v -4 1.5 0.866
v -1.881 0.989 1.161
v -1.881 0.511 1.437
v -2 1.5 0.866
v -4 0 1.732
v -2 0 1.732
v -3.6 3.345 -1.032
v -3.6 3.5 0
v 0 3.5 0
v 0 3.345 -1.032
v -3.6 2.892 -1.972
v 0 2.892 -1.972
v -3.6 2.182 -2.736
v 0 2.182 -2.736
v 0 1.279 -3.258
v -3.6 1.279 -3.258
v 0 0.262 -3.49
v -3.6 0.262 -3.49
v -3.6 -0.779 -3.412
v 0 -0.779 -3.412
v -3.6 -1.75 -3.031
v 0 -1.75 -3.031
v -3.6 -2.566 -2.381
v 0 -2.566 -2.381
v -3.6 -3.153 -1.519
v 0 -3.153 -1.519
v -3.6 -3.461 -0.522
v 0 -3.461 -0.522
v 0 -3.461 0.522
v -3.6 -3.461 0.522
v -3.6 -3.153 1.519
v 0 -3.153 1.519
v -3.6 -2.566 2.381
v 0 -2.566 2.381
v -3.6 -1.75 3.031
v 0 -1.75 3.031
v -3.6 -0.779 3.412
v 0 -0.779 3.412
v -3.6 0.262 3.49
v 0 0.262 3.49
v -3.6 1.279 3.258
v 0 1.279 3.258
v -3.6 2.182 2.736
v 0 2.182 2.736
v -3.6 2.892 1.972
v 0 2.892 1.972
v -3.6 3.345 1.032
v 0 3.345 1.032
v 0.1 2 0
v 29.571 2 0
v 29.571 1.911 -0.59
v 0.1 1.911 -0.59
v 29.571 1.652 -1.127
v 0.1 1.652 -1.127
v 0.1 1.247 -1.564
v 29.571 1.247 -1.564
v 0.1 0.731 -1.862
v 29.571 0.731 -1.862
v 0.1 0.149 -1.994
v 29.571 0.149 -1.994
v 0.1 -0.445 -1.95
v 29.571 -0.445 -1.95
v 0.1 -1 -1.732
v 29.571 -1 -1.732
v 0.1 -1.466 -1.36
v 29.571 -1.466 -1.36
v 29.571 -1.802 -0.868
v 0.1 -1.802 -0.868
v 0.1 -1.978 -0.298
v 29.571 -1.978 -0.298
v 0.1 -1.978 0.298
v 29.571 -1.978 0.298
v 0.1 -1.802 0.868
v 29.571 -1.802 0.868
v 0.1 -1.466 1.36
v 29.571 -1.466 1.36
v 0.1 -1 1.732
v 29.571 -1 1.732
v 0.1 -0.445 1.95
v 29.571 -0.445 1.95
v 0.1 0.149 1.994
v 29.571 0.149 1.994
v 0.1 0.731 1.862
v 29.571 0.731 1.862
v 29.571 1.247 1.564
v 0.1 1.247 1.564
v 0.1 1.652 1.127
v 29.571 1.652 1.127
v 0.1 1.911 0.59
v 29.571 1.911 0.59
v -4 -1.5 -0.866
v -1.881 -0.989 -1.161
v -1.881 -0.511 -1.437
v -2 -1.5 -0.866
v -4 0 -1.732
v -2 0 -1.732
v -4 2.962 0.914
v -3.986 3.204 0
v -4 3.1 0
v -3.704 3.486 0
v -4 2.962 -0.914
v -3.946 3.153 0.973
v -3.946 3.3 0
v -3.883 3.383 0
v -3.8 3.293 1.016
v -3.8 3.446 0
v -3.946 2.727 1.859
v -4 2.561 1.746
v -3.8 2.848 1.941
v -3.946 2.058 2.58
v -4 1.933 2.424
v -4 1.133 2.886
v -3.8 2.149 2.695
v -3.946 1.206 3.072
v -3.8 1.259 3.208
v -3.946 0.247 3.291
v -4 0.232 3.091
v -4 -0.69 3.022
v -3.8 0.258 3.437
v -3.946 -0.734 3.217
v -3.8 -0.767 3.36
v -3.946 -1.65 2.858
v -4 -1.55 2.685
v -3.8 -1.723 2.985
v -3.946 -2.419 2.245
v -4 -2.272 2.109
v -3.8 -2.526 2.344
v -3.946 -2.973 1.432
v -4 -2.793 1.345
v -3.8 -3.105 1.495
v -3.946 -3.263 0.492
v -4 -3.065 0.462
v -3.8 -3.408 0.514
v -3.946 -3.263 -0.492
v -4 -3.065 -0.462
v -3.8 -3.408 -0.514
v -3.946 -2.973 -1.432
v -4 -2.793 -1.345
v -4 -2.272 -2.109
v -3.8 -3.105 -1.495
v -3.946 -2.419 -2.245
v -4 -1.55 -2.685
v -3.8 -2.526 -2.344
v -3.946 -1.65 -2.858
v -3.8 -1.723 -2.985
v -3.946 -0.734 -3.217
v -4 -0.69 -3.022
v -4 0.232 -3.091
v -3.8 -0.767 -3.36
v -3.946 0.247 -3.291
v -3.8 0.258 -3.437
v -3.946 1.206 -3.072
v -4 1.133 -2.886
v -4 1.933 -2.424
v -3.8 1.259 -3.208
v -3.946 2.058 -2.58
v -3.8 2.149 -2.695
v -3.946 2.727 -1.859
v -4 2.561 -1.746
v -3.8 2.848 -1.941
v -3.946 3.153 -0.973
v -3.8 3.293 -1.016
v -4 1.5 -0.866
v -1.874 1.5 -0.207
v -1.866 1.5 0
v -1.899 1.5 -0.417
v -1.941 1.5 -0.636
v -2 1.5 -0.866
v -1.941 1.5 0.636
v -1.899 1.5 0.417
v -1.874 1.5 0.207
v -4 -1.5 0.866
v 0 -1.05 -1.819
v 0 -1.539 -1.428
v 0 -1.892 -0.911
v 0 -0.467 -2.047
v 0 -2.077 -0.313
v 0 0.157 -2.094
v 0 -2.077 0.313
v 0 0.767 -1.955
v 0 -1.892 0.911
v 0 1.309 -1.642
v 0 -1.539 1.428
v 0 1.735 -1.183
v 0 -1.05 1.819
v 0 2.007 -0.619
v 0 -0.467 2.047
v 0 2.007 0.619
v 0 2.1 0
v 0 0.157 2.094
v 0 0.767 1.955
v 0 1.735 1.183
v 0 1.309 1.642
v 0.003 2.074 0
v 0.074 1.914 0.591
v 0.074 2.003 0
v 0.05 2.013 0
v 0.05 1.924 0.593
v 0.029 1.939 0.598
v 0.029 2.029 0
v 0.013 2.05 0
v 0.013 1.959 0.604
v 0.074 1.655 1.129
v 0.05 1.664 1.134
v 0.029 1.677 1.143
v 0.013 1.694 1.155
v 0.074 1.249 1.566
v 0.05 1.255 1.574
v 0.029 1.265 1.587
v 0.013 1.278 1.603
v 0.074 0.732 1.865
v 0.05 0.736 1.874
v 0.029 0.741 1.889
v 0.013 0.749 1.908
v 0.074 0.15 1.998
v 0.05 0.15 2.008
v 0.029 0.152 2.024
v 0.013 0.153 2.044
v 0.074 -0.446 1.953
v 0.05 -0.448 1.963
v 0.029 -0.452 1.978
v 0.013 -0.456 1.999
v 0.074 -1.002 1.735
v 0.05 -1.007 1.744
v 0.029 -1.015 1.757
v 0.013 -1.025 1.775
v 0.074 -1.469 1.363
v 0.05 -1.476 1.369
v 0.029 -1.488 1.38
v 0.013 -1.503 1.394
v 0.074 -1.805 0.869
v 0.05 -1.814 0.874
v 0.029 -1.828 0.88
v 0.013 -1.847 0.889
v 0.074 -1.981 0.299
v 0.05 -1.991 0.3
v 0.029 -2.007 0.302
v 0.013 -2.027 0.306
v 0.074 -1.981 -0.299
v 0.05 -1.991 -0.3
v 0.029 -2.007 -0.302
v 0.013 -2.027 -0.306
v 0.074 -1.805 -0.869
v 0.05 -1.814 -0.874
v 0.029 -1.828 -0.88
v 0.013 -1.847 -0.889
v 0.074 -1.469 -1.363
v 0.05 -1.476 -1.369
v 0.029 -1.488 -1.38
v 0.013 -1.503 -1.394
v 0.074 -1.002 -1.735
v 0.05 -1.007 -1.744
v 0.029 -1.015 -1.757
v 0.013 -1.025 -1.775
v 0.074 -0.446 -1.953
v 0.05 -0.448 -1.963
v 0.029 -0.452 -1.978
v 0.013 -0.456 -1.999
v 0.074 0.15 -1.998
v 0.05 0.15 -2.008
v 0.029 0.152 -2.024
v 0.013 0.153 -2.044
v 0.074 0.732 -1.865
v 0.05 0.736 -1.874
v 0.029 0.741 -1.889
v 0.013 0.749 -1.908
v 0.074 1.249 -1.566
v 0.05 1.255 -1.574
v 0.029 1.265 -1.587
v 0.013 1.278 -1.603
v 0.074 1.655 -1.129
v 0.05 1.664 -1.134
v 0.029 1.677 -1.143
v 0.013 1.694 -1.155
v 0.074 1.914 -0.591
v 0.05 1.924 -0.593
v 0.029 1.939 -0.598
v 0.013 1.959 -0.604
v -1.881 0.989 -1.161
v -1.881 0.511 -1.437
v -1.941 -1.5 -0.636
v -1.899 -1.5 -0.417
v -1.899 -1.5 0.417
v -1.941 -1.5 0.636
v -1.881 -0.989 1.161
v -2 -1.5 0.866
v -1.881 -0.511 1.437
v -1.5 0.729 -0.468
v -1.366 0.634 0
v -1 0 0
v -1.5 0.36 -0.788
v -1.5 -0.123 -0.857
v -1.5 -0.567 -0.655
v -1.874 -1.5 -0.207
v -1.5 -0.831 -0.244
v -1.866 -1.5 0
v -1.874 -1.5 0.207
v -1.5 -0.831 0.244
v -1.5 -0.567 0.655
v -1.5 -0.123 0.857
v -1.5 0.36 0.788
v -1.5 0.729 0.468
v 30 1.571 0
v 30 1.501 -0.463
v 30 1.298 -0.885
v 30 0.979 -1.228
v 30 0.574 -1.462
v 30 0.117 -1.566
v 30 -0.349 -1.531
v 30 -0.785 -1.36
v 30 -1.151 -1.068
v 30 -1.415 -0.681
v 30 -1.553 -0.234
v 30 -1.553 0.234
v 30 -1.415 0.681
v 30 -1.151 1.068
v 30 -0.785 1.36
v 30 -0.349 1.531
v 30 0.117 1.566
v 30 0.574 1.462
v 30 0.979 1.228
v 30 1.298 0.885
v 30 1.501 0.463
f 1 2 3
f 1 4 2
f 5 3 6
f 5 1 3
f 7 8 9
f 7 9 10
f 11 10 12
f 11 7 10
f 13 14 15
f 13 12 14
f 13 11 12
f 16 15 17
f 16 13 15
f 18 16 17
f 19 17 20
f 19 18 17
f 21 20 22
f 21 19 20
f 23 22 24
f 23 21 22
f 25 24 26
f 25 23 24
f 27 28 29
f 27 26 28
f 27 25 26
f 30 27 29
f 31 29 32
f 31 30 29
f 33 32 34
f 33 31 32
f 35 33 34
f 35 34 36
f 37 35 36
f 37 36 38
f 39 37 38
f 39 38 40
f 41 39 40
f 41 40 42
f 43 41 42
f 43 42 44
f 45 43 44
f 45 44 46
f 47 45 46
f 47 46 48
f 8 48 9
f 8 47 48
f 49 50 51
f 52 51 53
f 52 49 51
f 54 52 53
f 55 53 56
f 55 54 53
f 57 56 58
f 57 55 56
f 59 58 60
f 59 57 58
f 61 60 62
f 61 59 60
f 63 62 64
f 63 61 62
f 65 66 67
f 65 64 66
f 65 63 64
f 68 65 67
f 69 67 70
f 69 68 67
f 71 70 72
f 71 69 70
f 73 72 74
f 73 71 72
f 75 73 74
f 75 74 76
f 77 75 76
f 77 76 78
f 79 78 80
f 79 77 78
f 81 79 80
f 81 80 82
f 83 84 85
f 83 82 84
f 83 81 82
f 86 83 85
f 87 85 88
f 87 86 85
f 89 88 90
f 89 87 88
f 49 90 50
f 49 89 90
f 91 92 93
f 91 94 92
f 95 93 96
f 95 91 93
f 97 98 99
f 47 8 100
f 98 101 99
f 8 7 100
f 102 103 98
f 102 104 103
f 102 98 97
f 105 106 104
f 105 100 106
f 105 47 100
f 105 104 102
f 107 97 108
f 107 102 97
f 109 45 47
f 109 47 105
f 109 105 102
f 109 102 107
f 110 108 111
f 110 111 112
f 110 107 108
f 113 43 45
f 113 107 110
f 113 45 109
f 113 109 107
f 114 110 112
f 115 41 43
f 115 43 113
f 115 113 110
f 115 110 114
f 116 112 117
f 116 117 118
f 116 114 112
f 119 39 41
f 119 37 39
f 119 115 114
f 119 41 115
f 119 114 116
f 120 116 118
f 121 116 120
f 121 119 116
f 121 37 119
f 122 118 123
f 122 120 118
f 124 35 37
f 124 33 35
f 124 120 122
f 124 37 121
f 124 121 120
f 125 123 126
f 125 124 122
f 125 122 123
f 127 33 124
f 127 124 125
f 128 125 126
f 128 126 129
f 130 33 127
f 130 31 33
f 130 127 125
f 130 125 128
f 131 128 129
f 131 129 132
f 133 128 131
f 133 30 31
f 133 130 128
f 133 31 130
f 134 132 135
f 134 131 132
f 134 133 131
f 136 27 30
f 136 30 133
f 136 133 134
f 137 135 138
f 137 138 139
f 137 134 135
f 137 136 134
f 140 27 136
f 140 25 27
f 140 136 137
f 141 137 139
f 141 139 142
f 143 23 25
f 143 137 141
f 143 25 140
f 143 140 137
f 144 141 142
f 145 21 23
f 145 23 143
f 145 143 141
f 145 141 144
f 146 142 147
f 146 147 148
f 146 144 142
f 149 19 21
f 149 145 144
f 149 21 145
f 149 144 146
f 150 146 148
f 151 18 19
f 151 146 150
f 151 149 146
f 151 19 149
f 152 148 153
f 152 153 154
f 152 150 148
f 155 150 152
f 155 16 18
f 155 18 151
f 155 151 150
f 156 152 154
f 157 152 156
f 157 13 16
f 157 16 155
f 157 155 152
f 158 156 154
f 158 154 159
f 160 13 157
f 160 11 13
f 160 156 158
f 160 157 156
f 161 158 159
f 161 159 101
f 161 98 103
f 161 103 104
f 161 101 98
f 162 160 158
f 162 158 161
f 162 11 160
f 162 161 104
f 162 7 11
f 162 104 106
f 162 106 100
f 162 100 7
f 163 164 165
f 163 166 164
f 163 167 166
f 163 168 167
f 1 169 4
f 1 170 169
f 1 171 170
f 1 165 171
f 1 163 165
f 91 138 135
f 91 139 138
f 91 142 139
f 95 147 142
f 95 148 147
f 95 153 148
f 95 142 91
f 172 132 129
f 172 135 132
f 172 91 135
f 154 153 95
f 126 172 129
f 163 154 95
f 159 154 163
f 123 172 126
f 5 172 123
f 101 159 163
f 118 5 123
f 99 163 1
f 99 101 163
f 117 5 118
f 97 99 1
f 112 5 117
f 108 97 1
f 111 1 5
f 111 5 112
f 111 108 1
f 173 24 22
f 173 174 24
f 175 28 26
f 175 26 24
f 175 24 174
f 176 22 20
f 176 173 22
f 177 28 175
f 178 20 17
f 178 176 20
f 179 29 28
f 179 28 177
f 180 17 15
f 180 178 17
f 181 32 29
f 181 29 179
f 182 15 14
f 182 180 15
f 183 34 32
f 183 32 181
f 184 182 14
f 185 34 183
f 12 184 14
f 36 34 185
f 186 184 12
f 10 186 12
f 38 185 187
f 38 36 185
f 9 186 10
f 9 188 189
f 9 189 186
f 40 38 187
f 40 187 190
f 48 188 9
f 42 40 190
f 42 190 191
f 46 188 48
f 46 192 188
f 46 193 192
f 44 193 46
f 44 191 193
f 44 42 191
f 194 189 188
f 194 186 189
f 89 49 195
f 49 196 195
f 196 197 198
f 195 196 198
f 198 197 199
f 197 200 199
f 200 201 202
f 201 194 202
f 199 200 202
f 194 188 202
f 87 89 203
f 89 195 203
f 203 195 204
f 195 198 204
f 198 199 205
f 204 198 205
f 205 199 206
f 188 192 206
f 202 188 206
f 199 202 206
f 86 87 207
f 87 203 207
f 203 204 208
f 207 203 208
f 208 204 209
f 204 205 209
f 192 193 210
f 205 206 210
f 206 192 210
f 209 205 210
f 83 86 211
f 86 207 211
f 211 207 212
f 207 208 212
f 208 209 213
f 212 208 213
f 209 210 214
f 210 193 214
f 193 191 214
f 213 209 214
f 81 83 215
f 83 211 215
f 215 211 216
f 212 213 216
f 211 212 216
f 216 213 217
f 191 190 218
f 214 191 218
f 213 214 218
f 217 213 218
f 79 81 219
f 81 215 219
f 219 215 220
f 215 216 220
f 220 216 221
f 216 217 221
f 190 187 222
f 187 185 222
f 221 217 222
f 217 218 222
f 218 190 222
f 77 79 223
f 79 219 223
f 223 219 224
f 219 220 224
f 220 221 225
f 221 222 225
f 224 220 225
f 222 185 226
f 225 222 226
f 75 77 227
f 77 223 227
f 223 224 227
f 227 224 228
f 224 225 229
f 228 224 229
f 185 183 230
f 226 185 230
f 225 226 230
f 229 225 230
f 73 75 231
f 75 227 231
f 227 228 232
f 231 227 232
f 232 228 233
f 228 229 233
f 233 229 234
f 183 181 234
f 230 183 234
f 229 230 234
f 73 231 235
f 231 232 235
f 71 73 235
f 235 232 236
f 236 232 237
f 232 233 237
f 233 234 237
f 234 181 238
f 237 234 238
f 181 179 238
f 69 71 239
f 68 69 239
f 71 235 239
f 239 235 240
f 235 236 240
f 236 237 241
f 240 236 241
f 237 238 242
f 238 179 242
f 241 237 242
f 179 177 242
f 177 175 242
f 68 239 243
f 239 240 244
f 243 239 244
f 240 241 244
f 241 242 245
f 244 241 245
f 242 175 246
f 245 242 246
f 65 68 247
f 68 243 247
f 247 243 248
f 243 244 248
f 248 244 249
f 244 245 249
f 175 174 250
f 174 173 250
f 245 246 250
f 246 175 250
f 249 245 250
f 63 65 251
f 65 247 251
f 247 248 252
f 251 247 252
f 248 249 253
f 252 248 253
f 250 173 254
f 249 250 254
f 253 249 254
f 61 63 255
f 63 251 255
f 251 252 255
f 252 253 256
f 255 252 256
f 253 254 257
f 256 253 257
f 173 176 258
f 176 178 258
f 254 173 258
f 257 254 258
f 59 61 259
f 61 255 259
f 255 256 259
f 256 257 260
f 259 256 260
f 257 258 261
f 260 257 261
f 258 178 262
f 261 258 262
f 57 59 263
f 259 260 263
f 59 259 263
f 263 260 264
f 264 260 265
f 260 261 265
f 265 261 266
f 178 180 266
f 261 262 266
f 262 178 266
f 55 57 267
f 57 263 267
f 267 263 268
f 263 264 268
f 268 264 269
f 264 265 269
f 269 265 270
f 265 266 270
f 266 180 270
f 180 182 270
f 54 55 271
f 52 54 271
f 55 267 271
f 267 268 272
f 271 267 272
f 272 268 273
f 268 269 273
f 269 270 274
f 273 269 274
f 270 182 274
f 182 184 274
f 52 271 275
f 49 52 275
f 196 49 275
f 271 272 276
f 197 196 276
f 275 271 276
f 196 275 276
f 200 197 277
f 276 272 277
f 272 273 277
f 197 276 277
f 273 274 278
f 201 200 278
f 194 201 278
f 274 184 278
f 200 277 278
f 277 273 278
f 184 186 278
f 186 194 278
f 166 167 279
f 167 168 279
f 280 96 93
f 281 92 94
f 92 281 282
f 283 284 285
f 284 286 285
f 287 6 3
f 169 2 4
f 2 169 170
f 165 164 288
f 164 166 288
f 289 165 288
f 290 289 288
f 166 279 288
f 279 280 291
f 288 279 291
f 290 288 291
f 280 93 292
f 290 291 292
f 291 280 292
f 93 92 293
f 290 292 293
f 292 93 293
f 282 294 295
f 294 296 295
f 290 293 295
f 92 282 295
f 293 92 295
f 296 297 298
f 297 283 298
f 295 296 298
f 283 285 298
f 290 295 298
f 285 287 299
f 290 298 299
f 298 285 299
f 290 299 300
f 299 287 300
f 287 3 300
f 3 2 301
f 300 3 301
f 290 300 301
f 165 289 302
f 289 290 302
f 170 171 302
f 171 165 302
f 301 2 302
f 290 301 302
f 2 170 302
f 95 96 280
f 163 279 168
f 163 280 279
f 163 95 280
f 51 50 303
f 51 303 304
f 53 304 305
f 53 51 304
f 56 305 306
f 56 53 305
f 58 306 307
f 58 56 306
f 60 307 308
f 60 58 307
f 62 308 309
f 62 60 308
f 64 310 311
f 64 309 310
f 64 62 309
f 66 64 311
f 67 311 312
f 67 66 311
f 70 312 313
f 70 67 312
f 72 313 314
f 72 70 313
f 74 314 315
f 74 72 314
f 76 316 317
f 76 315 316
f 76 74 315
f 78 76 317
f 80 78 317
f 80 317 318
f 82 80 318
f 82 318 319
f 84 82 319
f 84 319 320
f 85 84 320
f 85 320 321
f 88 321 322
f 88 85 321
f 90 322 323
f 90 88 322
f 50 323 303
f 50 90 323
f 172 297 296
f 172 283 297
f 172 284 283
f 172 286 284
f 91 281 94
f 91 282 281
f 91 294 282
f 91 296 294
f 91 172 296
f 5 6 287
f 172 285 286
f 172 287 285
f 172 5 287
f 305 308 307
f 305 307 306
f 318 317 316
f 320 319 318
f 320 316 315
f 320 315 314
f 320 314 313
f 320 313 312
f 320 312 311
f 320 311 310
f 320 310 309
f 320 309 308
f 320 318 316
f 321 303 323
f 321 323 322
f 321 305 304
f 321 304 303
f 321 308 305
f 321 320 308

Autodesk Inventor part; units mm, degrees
ref_plane "YZ Plane" through (0, 0, 0) normal (1, 0, 0) x (0, 1, 0)
ref_plane "XZ Plane" through (0, 0, 0) normal (0, 1, 0) x (-1, 0, 0)
sketch "Sketch1" plane through (0, 0, 0) normal (0, 0, 1) x (1, 0, 0)
  line L0 (-1, 0) -> (30, 0)
  line L1 (30, 0) -> (30, 2)
  line L2 (30, 2) -> (10, 2)
  line L3 (10, 2) -> (9.5705, 2)
  line L4 (9.5705, 2) -> (0, 2)
  line L5 (0, 2) -> (0, 3.5)
  line L6 (0, 3.5) -> (-4, 3.5)
  line L7 (-4, 3.5) -> (-4, 1.7321)
  line L8 (-4, 1.7321) -> (-2, 1.7321)
  line L9 (-2, 1.7321) -> (-1, 0)
  line L10 (-10.8, 0) -> (36.8, 0) projected
  line L11 (0, -0.7) -> (0, 4.2) projected
  line L12 (10, 2) -> (0, 2) construction
  dimension "d1" = 20
  dimension "d2" = 0.4295
  dimension "d3" = 4
  dimension "d4" = 2
  dimension "d5" = 60
  dimension "d6" = 4
  dimension "d7" = 4
  dimension "d8" = 3.4641
  dimension "d9" = 7
  dimension "d26" = 30
revolve "Body" add sketch "Sketch1" angle 360 about axis through (-1, 0, 0) along (1, 0, 0)
sketch "Sketch2" plane through (-4, 0, 0) normal (-1, 0, 0) x (0, 0, 1)
  circle A0 centre (0, 0) radius 1.7321 projected
  line L0 (0, -4.9) -> (0, 4.9) projected
  line L1 (-4.9, 0) -> (4.9, 0) projected
  line L2 (1.7321, 0) -> (0.866, -1.5)
  line L3 (0.866, -1.5) -> (-0.866, -1.5)
  line L4 (-0.866, -1.5) -> (-1.7321, 0)
  line L5 (-1.7321, 0) -> (-0.866, 1.5)
  line L6 (-0.866, 1.5) -> (0.866, 1.5)
  line L7 (0.866, 1.5) -> (1.7321, 0)
extrude "Slot" add sketch "Sketch2" against normal up to next contours L7 A0 | A0 L2 | L6 L0 A0 | A0 L0 L3 | L0 L6 A0 | A0 L3 L0 | L4 A0 | A0 L5
fillet "Fillet1" radius 0.4 1 edges at (-4, -3.5, 0)
thread "Thread" size "M4x0.7" class "6g" standard "ISO Metric profile" length 20
chamfer "Chamfer1" distance 0.4294 distance2 0.4294 1 edges at (30, -2, 0) measured on face at (30, -0.499, -0.4421)
ref_plane "Work Plane1" through (29, 0, 0) normal (0, -1, 0) x (1, 0, 0)
fillet "Fillet2" radius 0.1 1 edges at (0, -2, 0)
equation "\"d1\" = GEL"
equation "\"d3\" = KOH"
equation "\"d4\" = INTI"
equation "\"d6\" = GD"
equation "\"d7\" = BDM"
equation "\"d8\" = 1.1547 * SW"
equation "\"d9\" = KOD"
equation "\"d26\" = NLG"
equation "\"d30\" = R"
equation "\"d17\" = RR"
equation "\"d13\" = GEL"
equation "\"d15\" = -0.5 * SPD + 0.5 * GD"
equation "\"d16\" = GUL"
equation "\"GD\" = NND"
equation "\"NLG\" = 30"
equation "\"GEL\" = 20"
equation "\"KOD\" = 7"
equation "\"KOH\" = 4"
equation "\"INTI\" = 2"
equation "\"GAL\" = 0.61345 * PTC"
equation "\"GUL\" = 0.61345 * PTC"
equation "\"BDM\" = NND"
equation "\"SW\" = 3"
equation "\"RR\" = 0.4"
equation "\"SPD\" = 3.14117"
equation "\"R\" = 0.1"
equation "\"TOA\" = 30deg"
equation "\"THREADDIA\" = 4"
equation "\"PTC\" = 0.7"
equation "\"NND\" = 4"
equation "\"E0\" = 1.155 * SW"
equation "\"GD1\" = THREADDIA - 1.2269 * PTC"
properties part number "ANSI B18.3.1M - M4x0.7 x 30" material "Steel, Mild"
